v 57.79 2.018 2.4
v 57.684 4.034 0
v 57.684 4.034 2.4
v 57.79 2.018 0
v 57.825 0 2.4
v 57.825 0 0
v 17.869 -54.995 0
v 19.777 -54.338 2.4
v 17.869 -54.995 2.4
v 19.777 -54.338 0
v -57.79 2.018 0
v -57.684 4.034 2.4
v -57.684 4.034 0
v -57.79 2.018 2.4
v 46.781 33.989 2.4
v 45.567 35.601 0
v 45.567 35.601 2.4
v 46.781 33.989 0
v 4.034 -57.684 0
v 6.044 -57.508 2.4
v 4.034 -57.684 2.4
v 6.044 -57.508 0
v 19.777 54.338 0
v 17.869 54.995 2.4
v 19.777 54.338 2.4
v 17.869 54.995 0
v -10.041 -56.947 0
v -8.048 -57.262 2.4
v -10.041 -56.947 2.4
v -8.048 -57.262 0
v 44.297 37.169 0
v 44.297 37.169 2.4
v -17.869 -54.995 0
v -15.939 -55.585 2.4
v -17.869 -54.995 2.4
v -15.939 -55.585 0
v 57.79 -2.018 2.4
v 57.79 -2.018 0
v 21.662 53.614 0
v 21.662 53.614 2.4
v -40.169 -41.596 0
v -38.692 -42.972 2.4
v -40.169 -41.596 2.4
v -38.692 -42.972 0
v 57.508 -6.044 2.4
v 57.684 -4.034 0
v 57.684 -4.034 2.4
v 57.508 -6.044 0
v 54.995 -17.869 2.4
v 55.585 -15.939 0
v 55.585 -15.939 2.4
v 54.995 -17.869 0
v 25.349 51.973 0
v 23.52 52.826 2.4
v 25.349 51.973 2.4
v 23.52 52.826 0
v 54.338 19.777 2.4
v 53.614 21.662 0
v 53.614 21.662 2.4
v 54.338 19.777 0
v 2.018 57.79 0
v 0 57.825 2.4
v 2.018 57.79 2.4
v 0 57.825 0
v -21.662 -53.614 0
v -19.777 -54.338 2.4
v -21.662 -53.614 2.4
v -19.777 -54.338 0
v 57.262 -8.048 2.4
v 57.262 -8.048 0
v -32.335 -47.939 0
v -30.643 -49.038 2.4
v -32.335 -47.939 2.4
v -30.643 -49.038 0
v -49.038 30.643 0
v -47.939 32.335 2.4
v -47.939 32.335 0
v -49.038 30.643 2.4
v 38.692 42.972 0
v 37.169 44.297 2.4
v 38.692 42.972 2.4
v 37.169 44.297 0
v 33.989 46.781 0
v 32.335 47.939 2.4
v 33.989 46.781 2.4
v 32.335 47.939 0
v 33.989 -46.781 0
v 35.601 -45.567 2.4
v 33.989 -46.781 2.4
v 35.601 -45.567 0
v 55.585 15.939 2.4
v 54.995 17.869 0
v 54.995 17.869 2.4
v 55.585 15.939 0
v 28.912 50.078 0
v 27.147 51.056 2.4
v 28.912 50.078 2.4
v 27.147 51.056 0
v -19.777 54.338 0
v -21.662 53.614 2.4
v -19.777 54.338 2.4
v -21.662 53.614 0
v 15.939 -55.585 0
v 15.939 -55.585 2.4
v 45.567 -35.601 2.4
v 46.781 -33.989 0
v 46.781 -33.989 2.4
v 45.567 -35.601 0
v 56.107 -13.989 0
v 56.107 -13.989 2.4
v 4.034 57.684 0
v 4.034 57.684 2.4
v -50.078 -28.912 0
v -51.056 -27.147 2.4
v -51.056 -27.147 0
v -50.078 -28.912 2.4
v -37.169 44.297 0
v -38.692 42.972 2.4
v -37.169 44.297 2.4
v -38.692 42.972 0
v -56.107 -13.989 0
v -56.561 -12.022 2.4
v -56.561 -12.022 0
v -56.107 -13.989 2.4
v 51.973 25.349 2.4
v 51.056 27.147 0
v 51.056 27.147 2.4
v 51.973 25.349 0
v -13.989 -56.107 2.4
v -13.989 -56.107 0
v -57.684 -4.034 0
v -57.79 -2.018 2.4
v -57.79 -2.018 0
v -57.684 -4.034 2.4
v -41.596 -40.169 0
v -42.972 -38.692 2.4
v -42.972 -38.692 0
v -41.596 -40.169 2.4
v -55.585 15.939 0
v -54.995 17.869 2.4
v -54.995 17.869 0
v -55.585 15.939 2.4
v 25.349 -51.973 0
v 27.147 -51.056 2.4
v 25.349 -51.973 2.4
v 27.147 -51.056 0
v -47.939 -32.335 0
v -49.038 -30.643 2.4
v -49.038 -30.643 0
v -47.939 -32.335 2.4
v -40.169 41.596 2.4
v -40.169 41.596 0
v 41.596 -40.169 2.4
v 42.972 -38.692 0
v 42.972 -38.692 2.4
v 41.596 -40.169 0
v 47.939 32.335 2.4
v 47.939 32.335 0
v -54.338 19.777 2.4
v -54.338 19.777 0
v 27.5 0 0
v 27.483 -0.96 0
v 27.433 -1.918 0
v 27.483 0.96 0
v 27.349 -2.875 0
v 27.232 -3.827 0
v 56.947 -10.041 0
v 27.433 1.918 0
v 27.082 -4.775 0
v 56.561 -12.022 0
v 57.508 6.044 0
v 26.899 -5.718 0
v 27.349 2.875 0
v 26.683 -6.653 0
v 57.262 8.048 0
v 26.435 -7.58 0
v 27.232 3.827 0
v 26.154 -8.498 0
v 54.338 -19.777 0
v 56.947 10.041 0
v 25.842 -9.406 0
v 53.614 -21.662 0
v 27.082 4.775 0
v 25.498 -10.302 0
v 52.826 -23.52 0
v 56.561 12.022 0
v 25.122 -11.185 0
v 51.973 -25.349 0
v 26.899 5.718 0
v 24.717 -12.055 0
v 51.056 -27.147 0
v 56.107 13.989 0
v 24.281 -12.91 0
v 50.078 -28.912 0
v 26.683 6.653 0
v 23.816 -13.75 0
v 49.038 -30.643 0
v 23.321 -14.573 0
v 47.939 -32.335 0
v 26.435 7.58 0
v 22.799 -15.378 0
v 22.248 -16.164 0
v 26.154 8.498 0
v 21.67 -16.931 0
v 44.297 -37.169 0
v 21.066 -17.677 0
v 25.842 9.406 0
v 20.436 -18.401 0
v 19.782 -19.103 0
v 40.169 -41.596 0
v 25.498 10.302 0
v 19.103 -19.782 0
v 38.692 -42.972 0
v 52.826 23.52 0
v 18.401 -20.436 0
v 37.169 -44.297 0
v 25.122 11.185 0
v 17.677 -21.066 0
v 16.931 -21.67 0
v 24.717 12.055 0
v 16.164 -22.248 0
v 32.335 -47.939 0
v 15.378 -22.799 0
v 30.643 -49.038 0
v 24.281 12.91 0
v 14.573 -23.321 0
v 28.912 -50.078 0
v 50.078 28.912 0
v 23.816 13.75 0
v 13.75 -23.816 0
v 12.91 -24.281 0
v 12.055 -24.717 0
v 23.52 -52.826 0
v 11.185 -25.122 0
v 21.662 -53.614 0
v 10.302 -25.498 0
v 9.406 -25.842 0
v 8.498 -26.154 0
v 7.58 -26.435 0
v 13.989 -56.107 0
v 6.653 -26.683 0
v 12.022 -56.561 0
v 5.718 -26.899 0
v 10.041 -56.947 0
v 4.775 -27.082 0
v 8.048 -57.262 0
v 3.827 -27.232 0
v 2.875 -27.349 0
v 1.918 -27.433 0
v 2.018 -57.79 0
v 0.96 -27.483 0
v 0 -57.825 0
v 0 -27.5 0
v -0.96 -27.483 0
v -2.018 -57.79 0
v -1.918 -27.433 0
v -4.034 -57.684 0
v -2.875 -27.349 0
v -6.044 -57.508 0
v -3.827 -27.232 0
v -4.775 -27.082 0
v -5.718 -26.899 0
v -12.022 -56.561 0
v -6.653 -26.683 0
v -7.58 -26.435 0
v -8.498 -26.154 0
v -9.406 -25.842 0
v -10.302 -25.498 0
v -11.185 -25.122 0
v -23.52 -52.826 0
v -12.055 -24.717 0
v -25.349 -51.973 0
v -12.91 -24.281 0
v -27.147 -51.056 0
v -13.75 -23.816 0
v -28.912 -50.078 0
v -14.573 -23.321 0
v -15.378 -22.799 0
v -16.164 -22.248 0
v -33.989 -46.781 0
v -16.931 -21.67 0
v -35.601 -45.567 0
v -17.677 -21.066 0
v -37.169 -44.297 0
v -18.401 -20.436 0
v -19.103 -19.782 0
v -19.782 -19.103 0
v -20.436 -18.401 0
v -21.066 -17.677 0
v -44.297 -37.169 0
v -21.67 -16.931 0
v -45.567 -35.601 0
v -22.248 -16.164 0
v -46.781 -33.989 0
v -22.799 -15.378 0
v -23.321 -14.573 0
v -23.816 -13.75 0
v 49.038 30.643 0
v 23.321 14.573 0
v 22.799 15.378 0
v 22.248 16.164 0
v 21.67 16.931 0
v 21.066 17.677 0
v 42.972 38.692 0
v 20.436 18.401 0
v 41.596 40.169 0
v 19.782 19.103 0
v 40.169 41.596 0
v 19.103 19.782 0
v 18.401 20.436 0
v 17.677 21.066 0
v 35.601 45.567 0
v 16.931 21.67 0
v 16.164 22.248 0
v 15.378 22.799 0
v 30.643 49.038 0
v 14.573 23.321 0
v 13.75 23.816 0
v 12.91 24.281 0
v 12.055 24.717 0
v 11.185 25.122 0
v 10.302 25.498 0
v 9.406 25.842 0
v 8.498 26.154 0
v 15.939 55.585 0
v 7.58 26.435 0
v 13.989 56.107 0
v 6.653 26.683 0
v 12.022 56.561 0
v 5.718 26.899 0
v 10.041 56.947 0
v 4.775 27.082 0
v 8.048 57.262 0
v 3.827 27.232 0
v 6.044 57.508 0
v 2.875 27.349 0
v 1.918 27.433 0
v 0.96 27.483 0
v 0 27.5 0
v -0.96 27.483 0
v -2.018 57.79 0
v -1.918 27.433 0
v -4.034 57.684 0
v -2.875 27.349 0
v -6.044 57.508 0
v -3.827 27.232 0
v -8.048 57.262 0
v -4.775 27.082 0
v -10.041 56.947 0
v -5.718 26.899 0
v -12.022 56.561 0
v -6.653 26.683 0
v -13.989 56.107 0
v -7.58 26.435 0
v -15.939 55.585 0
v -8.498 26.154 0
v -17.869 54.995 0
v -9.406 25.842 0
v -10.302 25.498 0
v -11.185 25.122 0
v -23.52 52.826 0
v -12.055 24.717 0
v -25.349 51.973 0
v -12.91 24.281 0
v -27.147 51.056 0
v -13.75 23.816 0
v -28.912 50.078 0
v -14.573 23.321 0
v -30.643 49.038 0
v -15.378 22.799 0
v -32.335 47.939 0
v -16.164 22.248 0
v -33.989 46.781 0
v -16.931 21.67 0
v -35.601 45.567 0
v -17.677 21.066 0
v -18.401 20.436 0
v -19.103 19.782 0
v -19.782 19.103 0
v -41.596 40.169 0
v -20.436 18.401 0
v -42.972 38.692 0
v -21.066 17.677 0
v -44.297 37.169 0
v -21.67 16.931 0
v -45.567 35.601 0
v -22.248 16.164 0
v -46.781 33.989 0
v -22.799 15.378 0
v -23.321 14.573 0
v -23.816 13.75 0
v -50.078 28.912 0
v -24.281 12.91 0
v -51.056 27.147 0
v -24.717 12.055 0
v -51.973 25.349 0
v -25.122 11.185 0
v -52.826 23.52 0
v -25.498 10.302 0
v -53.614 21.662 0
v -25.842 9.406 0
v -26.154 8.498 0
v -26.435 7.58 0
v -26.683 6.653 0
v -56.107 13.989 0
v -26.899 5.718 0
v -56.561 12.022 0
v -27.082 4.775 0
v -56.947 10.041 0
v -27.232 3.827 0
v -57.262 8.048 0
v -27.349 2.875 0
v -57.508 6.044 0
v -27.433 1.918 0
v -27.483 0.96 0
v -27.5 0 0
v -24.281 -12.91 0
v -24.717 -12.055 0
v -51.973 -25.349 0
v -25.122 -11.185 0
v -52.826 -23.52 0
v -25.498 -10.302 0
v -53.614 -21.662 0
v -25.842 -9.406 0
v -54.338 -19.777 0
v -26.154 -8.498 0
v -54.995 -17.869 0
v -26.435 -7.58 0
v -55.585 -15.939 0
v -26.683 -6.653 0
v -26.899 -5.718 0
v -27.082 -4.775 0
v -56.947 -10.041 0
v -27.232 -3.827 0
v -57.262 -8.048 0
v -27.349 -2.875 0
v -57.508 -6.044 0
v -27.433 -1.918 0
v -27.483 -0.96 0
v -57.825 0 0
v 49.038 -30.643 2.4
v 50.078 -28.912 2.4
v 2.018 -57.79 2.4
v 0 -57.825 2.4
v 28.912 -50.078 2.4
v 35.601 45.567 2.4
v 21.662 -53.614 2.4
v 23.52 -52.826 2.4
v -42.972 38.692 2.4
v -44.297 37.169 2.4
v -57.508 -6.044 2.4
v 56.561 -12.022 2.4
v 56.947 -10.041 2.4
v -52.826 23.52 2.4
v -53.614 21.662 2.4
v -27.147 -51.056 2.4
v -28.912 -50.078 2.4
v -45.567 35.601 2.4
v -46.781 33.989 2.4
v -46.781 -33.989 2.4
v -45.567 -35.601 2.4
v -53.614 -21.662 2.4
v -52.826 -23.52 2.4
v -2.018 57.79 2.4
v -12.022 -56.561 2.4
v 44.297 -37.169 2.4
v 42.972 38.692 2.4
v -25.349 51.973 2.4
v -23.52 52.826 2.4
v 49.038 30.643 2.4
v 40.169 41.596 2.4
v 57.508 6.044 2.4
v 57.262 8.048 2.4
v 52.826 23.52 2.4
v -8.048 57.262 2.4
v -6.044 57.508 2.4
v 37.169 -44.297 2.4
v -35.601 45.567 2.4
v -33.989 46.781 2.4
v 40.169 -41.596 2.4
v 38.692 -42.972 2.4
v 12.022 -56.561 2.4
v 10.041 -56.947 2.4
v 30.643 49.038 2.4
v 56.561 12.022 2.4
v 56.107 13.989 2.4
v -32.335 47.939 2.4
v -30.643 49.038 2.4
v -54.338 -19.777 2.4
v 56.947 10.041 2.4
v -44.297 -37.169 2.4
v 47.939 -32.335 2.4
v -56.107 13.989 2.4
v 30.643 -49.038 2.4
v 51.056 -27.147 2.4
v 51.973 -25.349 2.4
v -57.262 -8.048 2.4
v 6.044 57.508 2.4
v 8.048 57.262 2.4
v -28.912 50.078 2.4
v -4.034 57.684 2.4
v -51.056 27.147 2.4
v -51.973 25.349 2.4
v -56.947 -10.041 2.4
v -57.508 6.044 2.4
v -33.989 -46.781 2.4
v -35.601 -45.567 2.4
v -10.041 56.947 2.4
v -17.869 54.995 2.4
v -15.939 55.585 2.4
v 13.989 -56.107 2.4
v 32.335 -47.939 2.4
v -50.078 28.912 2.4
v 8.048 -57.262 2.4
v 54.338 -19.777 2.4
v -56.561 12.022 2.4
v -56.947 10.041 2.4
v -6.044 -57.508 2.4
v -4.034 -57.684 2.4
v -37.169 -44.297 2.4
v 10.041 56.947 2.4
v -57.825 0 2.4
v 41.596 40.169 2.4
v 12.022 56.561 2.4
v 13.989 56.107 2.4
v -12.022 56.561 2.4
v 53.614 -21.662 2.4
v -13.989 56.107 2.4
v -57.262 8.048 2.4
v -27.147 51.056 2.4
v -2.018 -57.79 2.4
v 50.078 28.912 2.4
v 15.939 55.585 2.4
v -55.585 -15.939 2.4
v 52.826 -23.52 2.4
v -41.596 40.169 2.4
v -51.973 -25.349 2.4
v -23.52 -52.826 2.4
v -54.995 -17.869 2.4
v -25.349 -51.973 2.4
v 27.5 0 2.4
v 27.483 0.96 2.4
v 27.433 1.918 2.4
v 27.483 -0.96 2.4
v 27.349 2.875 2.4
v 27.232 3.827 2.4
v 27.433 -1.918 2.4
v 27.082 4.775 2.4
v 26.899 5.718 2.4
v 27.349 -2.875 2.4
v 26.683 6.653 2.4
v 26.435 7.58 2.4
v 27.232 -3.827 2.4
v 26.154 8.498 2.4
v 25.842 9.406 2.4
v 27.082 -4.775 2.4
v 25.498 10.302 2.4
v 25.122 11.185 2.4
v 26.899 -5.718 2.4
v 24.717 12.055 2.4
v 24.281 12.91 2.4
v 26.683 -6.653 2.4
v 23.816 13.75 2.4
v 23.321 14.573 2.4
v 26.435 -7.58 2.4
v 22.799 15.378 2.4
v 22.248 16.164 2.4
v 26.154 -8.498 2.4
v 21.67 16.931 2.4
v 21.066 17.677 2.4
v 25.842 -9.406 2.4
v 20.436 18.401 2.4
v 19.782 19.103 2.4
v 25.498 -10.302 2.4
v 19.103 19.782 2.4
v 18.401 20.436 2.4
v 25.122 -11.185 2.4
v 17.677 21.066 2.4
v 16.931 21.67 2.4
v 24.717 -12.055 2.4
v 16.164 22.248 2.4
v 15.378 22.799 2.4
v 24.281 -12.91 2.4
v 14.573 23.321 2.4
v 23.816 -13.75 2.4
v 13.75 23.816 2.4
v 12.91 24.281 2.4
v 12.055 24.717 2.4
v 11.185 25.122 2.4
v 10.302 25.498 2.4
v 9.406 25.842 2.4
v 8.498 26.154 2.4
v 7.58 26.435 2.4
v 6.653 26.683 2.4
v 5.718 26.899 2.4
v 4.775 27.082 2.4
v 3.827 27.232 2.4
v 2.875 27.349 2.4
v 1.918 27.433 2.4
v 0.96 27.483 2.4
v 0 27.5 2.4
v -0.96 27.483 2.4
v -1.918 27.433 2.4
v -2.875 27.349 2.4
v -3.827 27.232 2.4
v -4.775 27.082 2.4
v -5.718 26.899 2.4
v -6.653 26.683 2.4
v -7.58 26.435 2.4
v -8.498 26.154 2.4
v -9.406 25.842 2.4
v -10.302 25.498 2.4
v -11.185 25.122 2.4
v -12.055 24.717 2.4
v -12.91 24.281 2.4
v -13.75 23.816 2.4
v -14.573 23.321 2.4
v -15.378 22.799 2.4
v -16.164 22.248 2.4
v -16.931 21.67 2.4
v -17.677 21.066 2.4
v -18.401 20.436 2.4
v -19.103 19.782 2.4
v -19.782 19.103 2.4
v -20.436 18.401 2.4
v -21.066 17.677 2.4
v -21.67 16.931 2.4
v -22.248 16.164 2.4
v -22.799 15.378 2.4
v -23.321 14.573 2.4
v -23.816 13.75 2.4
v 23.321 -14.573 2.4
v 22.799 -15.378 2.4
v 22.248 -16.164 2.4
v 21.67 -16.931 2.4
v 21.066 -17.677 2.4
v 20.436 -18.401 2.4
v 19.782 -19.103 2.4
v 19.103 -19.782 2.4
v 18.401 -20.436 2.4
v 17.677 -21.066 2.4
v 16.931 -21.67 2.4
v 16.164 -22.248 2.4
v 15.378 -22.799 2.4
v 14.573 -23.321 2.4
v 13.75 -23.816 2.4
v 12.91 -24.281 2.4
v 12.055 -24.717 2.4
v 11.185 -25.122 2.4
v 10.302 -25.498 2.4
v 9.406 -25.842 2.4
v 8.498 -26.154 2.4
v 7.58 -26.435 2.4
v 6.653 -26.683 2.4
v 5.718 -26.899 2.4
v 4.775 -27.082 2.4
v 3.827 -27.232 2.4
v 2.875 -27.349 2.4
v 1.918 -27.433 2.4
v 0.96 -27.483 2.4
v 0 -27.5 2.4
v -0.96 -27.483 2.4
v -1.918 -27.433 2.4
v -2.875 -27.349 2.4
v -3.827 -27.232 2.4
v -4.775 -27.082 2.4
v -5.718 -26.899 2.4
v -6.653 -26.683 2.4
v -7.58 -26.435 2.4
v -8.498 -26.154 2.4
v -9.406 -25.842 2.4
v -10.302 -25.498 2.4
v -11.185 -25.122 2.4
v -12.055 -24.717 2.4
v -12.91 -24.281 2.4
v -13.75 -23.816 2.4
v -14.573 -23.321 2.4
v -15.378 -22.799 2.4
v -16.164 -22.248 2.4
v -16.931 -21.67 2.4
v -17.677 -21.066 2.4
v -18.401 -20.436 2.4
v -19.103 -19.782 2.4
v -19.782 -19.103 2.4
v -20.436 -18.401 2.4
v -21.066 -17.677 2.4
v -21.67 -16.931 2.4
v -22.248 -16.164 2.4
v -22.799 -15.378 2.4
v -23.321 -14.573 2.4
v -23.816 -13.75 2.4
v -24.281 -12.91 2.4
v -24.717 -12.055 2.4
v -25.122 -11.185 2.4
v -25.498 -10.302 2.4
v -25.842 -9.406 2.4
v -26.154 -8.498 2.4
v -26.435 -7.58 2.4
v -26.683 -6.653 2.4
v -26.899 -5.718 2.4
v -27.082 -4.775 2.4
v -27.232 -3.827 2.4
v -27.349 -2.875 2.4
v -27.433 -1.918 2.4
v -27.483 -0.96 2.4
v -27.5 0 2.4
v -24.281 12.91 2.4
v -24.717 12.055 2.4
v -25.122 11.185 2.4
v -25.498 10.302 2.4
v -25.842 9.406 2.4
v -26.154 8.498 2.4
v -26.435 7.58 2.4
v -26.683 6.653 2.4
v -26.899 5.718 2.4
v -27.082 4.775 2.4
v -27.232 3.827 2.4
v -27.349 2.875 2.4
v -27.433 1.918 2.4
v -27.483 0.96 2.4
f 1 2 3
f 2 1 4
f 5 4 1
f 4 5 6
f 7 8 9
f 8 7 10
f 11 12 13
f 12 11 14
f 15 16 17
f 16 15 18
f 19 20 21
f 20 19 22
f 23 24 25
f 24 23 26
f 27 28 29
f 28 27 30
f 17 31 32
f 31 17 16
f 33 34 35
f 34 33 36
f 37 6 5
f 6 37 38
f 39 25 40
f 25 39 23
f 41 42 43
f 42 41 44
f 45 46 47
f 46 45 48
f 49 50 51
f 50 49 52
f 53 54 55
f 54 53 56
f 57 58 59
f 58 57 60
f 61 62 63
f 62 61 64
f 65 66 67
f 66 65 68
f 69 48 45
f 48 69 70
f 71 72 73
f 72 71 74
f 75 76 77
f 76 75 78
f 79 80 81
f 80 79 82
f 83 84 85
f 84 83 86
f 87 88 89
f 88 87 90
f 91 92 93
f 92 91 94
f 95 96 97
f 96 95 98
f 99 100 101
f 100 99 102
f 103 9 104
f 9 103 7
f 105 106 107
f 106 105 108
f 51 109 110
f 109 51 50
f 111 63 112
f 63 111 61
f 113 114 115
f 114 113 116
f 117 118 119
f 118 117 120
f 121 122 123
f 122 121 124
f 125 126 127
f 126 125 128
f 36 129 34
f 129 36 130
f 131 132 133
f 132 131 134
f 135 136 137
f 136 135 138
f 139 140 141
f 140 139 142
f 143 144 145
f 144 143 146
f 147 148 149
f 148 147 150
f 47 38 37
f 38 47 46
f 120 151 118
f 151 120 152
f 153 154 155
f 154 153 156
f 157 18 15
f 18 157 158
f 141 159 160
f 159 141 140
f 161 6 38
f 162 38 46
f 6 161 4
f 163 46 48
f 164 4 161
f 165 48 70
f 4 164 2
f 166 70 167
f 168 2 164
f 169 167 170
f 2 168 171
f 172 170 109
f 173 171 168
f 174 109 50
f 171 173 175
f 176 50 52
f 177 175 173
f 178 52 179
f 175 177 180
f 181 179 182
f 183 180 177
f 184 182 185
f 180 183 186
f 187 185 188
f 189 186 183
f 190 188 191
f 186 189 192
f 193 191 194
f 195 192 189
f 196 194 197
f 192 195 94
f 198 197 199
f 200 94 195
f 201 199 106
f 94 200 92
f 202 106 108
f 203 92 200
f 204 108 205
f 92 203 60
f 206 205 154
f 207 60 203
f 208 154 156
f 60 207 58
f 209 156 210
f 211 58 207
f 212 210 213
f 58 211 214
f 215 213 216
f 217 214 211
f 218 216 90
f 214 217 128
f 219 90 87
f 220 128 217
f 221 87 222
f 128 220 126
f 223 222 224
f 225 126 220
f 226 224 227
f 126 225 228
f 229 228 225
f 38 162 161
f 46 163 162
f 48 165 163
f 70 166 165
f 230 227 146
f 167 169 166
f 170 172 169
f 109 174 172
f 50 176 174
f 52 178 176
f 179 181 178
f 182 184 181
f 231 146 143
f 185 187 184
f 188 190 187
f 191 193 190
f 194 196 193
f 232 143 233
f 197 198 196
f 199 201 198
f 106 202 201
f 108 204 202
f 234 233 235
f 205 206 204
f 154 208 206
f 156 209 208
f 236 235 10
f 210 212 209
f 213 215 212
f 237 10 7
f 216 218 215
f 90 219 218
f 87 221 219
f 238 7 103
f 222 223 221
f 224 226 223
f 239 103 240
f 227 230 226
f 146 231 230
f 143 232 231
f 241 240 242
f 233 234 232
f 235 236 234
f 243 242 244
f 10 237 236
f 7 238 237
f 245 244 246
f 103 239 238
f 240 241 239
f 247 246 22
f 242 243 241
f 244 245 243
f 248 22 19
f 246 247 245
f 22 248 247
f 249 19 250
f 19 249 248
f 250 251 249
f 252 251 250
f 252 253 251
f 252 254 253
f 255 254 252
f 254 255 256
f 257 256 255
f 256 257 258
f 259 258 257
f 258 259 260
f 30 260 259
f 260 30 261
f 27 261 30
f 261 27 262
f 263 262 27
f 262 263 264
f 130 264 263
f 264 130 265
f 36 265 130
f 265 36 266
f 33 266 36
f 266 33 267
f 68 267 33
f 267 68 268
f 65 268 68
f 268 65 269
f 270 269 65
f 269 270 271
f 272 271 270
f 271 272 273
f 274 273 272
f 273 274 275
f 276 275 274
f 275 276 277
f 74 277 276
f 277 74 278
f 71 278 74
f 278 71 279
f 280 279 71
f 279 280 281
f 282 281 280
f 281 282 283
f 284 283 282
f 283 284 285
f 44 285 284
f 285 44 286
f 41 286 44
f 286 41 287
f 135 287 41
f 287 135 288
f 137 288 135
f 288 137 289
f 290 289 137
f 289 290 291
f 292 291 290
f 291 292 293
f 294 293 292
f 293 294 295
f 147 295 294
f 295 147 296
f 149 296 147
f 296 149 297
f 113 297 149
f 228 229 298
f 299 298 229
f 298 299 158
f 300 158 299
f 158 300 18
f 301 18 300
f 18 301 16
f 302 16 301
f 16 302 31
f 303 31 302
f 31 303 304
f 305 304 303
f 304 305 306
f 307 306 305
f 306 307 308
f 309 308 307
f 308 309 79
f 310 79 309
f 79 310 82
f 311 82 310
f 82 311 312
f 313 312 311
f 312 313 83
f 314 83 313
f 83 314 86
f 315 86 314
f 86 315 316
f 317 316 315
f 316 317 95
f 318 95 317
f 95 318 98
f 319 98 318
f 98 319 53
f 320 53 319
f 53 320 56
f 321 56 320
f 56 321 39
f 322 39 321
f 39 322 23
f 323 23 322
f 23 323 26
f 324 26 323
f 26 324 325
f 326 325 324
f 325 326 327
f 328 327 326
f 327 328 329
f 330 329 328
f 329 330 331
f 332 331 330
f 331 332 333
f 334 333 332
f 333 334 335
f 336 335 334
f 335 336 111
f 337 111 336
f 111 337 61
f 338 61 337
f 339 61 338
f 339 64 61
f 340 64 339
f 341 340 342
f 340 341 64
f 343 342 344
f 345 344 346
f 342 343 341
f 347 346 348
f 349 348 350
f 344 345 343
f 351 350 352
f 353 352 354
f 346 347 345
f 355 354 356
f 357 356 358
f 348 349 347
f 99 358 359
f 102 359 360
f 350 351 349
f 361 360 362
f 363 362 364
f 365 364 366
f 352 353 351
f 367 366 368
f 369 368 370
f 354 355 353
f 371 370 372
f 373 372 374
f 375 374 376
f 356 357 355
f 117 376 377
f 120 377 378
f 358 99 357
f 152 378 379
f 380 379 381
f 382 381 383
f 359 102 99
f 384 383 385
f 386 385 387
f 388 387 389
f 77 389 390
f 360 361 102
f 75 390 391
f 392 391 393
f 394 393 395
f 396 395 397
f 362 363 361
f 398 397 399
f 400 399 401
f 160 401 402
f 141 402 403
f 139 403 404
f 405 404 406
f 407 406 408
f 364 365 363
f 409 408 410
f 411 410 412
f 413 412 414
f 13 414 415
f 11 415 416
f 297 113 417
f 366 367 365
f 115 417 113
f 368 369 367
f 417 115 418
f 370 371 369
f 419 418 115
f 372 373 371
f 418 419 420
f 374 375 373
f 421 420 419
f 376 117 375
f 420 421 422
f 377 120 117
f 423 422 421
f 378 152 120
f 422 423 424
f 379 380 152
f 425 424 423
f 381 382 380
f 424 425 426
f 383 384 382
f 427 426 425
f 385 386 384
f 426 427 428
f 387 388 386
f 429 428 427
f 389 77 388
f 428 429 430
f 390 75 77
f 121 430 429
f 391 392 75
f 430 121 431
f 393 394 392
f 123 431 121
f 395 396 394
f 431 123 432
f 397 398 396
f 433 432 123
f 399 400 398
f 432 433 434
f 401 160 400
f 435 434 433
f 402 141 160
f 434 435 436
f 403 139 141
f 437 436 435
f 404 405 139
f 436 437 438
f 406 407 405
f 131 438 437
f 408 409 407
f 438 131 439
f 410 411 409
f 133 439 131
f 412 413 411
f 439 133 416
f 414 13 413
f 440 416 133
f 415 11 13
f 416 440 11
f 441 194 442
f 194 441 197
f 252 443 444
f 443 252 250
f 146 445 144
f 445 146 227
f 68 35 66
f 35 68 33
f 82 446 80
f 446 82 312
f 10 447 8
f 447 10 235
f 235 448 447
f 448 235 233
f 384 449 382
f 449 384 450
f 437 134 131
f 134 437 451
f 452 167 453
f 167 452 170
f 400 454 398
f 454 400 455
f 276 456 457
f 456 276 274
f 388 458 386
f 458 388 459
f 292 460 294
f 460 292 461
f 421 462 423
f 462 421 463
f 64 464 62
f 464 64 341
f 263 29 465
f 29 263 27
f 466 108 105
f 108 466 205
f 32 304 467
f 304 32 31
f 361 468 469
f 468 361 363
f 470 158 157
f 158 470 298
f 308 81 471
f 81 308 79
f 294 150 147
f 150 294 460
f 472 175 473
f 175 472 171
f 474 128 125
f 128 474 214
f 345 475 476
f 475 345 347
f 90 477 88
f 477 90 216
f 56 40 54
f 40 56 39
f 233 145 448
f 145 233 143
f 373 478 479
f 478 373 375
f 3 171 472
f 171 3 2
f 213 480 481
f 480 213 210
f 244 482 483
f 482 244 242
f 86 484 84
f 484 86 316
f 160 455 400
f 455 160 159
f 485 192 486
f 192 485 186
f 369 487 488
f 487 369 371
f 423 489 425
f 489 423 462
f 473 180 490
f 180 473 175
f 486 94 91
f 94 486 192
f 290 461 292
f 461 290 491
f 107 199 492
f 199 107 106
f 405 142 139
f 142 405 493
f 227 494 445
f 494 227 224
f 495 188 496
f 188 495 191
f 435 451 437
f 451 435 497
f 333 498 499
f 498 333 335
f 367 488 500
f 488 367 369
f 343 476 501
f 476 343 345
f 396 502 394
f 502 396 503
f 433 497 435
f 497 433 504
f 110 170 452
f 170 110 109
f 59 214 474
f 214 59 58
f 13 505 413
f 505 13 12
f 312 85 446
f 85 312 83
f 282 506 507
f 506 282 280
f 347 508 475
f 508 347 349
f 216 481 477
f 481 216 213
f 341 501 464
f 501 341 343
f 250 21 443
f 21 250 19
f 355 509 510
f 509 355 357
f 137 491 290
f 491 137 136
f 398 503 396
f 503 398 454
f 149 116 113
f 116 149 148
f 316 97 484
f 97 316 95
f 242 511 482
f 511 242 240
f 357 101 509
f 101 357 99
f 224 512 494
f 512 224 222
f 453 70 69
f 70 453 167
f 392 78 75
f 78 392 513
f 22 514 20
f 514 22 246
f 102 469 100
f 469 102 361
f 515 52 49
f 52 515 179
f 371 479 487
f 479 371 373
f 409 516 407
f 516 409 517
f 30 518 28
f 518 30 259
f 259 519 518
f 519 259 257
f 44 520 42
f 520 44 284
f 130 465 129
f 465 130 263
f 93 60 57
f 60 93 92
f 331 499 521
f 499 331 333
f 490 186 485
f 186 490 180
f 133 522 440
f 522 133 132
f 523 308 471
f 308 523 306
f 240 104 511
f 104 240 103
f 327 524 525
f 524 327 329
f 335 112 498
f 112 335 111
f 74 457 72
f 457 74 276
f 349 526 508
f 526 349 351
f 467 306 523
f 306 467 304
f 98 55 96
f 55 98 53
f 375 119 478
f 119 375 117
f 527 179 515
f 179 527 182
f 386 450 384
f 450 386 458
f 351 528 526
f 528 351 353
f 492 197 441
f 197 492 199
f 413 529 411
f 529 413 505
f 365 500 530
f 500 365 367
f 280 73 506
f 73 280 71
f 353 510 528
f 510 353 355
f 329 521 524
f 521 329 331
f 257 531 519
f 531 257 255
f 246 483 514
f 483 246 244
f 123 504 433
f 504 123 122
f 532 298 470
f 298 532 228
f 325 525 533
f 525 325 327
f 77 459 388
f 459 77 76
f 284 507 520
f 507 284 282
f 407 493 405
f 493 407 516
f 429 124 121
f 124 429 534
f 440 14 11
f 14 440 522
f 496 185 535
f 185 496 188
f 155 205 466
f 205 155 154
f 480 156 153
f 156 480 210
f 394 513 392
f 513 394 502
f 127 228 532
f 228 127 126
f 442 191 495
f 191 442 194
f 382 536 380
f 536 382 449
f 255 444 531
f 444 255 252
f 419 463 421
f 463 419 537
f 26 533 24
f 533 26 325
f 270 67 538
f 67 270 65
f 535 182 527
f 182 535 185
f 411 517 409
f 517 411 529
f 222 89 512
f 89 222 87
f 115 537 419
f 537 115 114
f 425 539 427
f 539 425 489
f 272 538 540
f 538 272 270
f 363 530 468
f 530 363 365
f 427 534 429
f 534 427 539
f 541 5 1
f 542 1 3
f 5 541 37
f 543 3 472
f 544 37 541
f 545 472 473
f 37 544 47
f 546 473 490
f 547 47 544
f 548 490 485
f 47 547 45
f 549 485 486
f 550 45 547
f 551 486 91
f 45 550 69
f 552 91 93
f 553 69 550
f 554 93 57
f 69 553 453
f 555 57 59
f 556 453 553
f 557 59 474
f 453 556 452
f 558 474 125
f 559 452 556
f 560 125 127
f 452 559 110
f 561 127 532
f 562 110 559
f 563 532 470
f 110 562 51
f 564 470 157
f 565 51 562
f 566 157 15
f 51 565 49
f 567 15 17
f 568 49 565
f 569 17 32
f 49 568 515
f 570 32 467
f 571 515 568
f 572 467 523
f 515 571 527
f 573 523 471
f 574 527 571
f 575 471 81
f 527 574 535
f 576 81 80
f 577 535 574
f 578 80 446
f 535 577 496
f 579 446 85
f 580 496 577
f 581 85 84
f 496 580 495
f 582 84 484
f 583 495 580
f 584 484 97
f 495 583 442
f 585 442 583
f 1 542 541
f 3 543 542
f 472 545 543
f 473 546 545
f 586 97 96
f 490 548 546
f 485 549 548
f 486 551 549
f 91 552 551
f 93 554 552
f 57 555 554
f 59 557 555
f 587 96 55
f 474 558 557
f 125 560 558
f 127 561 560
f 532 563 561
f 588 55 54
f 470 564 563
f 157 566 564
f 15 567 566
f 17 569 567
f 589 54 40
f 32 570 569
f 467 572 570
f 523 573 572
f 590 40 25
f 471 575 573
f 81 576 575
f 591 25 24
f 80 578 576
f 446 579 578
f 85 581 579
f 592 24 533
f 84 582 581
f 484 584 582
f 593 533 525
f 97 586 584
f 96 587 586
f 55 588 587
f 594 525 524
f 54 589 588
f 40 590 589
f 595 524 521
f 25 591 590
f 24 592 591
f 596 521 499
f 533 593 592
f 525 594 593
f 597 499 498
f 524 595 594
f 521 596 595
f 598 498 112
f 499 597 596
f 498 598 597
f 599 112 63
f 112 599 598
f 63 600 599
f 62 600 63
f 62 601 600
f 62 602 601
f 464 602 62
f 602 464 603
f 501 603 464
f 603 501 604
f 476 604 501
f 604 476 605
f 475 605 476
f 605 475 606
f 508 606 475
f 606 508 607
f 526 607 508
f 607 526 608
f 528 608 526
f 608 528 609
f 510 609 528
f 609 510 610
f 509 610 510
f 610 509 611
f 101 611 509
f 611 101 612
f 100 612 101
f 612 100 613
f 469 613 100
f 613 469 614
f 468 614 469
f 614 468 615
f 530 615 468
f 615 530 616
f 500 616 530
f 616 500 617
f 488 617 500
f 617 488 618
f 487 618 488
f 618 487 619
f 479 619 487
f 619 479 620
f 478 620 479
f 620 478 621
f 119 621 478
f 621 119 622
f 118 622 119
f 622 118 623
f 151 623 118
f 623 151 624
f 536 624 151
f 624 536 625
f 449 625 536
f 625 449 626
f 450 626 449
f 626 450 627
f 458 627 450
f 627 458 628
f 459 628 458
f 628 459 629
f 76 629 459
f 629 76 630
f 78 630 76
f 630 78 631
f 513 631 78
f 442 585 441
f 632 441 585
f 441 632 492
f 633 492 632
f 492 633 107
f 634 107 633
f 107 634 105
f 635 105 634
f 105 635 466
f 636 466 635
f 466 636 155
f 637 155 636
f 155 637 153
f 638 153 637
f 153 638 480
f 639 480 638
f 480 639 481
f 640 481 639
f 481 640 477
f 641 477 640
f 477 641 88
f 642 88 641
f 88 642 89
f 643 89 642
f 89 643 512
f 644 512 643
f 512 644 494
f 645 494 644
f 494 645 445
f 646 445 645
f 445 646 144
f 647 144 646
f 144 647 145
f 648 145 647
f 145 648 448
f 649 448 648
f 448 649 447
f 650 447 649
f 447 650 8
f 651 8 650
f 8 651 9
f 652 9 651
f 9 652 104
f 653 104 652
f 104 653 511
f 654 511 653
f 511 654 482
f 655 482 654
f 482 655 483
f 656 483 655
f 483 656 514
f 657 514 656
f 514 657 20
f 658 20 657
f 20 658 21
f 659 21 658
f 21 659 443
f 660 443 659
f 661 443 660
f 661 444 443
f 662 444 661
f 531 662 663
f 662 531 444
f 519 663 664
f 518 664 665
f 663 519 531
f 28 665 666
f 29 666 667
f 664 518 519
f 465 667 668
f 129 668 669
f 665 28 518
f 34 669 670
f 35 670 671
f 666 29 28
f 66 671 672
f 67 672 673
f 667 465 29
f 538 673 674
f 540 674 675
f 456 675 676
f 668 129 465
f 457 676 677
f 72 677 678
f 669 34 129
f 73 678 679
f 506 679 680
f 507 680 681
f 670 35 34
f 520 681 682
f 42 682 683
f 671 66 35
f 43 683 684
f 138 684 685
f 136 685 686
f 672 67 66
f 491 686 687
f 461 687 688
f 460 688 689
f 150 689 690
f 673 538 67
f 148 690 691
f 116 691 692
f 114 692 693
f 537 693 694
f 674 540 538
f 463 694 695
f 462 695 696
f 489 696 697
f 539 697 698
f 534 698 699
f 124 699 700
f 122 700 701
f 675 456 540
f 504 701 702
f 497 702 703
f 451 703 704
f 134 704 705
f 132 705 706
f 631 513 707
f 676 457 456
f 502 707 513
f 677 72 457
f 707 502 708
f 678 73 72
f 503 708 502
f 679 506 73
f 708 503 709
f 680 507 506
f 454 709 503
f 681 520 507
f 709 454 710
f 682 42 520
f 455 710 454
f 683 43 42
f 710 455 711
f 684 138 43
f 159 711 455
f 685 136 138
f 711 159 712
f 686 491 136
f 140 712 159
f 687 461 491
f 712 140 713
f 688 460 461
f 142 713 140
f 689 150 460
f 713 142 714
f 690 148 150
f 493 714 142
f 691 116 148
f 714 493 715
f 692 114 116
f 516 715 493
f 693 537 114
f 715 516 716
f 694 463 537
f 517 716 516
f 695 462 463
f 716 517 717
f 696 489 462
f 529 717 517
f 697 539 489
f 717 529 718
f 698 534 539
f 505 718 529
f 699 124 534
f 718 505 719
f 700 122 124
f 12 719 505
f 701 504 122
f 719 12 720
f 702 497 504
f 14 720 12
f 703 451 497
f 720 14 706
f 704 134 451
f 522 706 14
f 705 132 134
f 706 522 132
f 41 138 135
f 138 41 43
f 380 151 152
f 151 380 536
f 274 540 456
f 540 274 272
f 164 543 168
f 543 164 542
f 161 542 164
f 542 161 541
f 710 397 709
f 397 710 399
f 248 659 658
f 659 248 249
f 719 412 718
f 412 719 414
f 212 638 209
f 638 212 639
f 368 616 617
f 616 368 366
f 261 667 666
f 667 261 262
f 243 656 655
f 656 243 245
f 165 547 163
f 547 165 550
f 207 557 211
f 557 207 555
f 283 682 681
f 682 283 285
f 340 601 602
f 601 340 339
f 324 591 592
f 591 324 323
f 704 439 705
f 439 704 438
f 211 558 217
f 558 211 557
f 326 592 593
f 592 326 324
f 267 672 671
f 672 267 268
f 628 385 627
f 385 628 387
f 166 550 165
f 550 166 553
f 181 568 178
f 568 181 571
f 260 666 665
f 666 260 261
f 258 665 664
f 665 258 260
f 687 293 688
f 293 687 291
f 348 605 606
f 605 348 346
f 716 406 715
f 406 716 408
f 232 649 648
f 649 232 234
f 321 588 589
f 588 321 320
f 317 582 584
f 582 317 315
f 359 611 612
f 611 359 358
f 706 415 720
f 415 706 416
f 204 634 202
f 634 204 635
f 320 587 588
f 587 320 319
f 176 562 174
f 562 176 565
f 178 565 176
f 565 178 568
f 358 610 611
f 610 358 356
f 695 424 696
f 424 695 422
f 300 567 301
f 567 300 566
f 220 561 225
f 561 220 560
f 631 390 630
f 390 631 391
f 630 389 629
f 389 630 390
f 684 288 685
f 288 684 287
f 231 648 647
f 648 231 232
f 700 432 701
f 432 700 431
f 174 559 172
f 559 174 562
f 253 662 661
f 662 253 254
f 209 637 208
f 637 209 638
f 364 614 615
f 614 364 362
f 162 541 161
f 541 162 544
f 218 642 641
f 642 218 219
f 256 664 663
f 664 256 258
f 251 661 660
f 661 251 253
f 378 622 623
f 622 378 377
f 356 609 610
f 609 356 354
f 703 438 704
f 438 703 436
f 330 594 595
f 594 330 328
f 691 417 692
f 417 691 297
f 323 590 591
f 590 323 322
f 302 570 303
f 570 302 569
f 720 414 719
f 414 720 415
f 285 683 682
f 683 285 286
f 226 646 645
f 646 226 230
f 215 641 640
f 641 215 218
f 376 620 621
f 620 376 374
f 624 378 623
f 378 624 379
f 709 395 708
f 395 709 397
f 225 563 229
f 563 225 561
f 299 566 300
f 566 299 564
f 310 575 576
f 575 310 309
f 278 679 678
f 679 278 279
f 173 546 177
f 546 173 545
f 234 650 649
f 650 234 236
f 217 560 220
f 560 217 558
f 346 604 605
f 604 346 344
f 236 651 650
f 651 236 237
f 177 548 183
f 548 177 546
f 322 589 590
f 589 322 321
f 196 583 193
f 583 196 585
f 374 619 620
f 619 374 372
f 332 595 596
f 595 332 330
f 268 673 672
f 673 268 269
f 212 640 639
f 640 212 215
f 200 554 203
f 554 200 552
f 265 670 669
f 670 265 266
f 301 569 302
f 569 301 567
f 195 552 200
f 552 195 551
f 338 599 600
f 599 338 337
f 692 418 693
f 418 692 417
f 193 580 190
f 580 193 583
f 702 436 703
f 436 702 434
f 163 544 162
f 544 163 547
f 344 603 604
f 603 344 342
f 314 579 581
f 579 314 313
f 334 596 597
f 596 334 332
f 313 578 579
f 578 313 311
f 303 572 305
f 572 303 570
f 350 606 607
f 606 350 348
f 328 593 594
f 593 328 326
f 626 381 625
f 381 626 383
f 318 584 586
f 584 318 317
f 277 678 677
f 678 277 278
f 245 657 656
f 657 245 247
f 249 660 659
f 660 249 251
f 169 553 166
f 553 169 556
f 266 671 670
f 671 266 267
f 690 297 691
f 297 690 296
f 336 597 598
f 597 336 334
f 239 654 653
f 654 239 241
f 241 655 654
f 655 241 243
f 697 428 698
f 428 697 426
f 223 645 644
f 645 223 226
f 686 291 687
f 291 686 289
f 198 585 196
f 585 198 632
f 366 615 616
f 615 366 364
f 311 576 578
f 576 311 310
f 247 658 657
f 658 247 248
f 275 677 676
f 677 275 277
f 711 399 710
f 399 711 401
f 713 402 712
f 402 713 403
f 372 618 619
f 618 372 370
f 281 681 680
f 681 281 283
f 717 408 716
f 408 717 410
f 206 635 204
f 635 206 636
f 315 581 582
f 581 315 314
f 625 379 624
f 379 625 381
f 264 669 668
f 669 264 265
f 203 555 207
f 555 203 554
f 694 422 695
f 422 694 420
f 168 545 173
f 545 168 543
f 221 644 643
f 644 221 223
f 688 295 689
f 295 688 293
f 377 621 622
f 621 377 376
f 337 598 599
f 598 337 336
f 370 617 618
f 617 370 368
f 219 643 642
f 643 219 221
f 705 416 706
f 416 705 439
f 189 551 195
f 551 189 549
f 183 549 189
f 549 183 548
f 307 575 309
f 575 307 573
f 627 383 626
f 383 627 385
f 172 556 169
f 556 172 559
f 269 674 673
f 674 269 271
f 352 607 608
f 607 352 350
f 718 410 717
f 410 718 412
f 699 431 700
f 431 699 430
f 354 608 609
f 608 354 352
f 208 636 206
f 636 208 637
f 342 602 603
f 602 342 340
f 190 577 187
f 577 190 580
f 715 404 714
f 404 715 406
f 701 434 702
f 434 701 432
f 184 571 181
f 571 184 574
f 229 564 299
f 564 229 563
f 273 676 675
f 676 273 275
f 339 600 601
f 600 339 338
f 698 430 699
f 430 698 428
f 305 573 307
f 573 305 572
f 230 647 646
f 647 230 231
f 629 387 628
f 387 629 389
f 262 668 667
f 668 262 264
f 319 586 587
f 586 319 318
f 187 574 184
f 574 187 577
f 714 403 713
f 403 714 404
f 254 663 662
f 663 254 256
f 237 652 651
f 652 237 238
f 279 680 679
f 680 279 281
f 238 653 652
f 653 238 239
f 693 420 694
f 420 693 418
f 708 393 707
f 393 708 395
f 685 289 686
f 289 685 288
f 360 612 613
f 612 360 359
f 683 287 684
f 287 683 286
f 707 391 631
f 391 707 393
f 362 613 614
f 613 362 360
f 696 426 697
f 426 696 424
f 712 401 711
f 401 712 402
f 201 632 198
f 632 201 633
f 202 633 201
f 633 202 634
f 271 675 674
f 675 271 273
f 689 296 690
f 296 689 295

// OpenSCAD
// Parametric baffle ring for telescope tube.
// Generate one STL per baffle diameter.

$fn = 180;

tube_id = 116.0;           // tube inner diameter (example)
ring_thickness = 2.4;      // axial thickness
clear_aperture = 55.0;     // set this per baffle location
fit_clearance = 0.35;      // clearance for sliding fit

difference() {
    cylinder(h=ring_thickness, d=tube_id - fit_clearance);
    translate([0, 0, -0.5]) cylinder(h=ring_thickness + 1, d=clear_aperture);
}
